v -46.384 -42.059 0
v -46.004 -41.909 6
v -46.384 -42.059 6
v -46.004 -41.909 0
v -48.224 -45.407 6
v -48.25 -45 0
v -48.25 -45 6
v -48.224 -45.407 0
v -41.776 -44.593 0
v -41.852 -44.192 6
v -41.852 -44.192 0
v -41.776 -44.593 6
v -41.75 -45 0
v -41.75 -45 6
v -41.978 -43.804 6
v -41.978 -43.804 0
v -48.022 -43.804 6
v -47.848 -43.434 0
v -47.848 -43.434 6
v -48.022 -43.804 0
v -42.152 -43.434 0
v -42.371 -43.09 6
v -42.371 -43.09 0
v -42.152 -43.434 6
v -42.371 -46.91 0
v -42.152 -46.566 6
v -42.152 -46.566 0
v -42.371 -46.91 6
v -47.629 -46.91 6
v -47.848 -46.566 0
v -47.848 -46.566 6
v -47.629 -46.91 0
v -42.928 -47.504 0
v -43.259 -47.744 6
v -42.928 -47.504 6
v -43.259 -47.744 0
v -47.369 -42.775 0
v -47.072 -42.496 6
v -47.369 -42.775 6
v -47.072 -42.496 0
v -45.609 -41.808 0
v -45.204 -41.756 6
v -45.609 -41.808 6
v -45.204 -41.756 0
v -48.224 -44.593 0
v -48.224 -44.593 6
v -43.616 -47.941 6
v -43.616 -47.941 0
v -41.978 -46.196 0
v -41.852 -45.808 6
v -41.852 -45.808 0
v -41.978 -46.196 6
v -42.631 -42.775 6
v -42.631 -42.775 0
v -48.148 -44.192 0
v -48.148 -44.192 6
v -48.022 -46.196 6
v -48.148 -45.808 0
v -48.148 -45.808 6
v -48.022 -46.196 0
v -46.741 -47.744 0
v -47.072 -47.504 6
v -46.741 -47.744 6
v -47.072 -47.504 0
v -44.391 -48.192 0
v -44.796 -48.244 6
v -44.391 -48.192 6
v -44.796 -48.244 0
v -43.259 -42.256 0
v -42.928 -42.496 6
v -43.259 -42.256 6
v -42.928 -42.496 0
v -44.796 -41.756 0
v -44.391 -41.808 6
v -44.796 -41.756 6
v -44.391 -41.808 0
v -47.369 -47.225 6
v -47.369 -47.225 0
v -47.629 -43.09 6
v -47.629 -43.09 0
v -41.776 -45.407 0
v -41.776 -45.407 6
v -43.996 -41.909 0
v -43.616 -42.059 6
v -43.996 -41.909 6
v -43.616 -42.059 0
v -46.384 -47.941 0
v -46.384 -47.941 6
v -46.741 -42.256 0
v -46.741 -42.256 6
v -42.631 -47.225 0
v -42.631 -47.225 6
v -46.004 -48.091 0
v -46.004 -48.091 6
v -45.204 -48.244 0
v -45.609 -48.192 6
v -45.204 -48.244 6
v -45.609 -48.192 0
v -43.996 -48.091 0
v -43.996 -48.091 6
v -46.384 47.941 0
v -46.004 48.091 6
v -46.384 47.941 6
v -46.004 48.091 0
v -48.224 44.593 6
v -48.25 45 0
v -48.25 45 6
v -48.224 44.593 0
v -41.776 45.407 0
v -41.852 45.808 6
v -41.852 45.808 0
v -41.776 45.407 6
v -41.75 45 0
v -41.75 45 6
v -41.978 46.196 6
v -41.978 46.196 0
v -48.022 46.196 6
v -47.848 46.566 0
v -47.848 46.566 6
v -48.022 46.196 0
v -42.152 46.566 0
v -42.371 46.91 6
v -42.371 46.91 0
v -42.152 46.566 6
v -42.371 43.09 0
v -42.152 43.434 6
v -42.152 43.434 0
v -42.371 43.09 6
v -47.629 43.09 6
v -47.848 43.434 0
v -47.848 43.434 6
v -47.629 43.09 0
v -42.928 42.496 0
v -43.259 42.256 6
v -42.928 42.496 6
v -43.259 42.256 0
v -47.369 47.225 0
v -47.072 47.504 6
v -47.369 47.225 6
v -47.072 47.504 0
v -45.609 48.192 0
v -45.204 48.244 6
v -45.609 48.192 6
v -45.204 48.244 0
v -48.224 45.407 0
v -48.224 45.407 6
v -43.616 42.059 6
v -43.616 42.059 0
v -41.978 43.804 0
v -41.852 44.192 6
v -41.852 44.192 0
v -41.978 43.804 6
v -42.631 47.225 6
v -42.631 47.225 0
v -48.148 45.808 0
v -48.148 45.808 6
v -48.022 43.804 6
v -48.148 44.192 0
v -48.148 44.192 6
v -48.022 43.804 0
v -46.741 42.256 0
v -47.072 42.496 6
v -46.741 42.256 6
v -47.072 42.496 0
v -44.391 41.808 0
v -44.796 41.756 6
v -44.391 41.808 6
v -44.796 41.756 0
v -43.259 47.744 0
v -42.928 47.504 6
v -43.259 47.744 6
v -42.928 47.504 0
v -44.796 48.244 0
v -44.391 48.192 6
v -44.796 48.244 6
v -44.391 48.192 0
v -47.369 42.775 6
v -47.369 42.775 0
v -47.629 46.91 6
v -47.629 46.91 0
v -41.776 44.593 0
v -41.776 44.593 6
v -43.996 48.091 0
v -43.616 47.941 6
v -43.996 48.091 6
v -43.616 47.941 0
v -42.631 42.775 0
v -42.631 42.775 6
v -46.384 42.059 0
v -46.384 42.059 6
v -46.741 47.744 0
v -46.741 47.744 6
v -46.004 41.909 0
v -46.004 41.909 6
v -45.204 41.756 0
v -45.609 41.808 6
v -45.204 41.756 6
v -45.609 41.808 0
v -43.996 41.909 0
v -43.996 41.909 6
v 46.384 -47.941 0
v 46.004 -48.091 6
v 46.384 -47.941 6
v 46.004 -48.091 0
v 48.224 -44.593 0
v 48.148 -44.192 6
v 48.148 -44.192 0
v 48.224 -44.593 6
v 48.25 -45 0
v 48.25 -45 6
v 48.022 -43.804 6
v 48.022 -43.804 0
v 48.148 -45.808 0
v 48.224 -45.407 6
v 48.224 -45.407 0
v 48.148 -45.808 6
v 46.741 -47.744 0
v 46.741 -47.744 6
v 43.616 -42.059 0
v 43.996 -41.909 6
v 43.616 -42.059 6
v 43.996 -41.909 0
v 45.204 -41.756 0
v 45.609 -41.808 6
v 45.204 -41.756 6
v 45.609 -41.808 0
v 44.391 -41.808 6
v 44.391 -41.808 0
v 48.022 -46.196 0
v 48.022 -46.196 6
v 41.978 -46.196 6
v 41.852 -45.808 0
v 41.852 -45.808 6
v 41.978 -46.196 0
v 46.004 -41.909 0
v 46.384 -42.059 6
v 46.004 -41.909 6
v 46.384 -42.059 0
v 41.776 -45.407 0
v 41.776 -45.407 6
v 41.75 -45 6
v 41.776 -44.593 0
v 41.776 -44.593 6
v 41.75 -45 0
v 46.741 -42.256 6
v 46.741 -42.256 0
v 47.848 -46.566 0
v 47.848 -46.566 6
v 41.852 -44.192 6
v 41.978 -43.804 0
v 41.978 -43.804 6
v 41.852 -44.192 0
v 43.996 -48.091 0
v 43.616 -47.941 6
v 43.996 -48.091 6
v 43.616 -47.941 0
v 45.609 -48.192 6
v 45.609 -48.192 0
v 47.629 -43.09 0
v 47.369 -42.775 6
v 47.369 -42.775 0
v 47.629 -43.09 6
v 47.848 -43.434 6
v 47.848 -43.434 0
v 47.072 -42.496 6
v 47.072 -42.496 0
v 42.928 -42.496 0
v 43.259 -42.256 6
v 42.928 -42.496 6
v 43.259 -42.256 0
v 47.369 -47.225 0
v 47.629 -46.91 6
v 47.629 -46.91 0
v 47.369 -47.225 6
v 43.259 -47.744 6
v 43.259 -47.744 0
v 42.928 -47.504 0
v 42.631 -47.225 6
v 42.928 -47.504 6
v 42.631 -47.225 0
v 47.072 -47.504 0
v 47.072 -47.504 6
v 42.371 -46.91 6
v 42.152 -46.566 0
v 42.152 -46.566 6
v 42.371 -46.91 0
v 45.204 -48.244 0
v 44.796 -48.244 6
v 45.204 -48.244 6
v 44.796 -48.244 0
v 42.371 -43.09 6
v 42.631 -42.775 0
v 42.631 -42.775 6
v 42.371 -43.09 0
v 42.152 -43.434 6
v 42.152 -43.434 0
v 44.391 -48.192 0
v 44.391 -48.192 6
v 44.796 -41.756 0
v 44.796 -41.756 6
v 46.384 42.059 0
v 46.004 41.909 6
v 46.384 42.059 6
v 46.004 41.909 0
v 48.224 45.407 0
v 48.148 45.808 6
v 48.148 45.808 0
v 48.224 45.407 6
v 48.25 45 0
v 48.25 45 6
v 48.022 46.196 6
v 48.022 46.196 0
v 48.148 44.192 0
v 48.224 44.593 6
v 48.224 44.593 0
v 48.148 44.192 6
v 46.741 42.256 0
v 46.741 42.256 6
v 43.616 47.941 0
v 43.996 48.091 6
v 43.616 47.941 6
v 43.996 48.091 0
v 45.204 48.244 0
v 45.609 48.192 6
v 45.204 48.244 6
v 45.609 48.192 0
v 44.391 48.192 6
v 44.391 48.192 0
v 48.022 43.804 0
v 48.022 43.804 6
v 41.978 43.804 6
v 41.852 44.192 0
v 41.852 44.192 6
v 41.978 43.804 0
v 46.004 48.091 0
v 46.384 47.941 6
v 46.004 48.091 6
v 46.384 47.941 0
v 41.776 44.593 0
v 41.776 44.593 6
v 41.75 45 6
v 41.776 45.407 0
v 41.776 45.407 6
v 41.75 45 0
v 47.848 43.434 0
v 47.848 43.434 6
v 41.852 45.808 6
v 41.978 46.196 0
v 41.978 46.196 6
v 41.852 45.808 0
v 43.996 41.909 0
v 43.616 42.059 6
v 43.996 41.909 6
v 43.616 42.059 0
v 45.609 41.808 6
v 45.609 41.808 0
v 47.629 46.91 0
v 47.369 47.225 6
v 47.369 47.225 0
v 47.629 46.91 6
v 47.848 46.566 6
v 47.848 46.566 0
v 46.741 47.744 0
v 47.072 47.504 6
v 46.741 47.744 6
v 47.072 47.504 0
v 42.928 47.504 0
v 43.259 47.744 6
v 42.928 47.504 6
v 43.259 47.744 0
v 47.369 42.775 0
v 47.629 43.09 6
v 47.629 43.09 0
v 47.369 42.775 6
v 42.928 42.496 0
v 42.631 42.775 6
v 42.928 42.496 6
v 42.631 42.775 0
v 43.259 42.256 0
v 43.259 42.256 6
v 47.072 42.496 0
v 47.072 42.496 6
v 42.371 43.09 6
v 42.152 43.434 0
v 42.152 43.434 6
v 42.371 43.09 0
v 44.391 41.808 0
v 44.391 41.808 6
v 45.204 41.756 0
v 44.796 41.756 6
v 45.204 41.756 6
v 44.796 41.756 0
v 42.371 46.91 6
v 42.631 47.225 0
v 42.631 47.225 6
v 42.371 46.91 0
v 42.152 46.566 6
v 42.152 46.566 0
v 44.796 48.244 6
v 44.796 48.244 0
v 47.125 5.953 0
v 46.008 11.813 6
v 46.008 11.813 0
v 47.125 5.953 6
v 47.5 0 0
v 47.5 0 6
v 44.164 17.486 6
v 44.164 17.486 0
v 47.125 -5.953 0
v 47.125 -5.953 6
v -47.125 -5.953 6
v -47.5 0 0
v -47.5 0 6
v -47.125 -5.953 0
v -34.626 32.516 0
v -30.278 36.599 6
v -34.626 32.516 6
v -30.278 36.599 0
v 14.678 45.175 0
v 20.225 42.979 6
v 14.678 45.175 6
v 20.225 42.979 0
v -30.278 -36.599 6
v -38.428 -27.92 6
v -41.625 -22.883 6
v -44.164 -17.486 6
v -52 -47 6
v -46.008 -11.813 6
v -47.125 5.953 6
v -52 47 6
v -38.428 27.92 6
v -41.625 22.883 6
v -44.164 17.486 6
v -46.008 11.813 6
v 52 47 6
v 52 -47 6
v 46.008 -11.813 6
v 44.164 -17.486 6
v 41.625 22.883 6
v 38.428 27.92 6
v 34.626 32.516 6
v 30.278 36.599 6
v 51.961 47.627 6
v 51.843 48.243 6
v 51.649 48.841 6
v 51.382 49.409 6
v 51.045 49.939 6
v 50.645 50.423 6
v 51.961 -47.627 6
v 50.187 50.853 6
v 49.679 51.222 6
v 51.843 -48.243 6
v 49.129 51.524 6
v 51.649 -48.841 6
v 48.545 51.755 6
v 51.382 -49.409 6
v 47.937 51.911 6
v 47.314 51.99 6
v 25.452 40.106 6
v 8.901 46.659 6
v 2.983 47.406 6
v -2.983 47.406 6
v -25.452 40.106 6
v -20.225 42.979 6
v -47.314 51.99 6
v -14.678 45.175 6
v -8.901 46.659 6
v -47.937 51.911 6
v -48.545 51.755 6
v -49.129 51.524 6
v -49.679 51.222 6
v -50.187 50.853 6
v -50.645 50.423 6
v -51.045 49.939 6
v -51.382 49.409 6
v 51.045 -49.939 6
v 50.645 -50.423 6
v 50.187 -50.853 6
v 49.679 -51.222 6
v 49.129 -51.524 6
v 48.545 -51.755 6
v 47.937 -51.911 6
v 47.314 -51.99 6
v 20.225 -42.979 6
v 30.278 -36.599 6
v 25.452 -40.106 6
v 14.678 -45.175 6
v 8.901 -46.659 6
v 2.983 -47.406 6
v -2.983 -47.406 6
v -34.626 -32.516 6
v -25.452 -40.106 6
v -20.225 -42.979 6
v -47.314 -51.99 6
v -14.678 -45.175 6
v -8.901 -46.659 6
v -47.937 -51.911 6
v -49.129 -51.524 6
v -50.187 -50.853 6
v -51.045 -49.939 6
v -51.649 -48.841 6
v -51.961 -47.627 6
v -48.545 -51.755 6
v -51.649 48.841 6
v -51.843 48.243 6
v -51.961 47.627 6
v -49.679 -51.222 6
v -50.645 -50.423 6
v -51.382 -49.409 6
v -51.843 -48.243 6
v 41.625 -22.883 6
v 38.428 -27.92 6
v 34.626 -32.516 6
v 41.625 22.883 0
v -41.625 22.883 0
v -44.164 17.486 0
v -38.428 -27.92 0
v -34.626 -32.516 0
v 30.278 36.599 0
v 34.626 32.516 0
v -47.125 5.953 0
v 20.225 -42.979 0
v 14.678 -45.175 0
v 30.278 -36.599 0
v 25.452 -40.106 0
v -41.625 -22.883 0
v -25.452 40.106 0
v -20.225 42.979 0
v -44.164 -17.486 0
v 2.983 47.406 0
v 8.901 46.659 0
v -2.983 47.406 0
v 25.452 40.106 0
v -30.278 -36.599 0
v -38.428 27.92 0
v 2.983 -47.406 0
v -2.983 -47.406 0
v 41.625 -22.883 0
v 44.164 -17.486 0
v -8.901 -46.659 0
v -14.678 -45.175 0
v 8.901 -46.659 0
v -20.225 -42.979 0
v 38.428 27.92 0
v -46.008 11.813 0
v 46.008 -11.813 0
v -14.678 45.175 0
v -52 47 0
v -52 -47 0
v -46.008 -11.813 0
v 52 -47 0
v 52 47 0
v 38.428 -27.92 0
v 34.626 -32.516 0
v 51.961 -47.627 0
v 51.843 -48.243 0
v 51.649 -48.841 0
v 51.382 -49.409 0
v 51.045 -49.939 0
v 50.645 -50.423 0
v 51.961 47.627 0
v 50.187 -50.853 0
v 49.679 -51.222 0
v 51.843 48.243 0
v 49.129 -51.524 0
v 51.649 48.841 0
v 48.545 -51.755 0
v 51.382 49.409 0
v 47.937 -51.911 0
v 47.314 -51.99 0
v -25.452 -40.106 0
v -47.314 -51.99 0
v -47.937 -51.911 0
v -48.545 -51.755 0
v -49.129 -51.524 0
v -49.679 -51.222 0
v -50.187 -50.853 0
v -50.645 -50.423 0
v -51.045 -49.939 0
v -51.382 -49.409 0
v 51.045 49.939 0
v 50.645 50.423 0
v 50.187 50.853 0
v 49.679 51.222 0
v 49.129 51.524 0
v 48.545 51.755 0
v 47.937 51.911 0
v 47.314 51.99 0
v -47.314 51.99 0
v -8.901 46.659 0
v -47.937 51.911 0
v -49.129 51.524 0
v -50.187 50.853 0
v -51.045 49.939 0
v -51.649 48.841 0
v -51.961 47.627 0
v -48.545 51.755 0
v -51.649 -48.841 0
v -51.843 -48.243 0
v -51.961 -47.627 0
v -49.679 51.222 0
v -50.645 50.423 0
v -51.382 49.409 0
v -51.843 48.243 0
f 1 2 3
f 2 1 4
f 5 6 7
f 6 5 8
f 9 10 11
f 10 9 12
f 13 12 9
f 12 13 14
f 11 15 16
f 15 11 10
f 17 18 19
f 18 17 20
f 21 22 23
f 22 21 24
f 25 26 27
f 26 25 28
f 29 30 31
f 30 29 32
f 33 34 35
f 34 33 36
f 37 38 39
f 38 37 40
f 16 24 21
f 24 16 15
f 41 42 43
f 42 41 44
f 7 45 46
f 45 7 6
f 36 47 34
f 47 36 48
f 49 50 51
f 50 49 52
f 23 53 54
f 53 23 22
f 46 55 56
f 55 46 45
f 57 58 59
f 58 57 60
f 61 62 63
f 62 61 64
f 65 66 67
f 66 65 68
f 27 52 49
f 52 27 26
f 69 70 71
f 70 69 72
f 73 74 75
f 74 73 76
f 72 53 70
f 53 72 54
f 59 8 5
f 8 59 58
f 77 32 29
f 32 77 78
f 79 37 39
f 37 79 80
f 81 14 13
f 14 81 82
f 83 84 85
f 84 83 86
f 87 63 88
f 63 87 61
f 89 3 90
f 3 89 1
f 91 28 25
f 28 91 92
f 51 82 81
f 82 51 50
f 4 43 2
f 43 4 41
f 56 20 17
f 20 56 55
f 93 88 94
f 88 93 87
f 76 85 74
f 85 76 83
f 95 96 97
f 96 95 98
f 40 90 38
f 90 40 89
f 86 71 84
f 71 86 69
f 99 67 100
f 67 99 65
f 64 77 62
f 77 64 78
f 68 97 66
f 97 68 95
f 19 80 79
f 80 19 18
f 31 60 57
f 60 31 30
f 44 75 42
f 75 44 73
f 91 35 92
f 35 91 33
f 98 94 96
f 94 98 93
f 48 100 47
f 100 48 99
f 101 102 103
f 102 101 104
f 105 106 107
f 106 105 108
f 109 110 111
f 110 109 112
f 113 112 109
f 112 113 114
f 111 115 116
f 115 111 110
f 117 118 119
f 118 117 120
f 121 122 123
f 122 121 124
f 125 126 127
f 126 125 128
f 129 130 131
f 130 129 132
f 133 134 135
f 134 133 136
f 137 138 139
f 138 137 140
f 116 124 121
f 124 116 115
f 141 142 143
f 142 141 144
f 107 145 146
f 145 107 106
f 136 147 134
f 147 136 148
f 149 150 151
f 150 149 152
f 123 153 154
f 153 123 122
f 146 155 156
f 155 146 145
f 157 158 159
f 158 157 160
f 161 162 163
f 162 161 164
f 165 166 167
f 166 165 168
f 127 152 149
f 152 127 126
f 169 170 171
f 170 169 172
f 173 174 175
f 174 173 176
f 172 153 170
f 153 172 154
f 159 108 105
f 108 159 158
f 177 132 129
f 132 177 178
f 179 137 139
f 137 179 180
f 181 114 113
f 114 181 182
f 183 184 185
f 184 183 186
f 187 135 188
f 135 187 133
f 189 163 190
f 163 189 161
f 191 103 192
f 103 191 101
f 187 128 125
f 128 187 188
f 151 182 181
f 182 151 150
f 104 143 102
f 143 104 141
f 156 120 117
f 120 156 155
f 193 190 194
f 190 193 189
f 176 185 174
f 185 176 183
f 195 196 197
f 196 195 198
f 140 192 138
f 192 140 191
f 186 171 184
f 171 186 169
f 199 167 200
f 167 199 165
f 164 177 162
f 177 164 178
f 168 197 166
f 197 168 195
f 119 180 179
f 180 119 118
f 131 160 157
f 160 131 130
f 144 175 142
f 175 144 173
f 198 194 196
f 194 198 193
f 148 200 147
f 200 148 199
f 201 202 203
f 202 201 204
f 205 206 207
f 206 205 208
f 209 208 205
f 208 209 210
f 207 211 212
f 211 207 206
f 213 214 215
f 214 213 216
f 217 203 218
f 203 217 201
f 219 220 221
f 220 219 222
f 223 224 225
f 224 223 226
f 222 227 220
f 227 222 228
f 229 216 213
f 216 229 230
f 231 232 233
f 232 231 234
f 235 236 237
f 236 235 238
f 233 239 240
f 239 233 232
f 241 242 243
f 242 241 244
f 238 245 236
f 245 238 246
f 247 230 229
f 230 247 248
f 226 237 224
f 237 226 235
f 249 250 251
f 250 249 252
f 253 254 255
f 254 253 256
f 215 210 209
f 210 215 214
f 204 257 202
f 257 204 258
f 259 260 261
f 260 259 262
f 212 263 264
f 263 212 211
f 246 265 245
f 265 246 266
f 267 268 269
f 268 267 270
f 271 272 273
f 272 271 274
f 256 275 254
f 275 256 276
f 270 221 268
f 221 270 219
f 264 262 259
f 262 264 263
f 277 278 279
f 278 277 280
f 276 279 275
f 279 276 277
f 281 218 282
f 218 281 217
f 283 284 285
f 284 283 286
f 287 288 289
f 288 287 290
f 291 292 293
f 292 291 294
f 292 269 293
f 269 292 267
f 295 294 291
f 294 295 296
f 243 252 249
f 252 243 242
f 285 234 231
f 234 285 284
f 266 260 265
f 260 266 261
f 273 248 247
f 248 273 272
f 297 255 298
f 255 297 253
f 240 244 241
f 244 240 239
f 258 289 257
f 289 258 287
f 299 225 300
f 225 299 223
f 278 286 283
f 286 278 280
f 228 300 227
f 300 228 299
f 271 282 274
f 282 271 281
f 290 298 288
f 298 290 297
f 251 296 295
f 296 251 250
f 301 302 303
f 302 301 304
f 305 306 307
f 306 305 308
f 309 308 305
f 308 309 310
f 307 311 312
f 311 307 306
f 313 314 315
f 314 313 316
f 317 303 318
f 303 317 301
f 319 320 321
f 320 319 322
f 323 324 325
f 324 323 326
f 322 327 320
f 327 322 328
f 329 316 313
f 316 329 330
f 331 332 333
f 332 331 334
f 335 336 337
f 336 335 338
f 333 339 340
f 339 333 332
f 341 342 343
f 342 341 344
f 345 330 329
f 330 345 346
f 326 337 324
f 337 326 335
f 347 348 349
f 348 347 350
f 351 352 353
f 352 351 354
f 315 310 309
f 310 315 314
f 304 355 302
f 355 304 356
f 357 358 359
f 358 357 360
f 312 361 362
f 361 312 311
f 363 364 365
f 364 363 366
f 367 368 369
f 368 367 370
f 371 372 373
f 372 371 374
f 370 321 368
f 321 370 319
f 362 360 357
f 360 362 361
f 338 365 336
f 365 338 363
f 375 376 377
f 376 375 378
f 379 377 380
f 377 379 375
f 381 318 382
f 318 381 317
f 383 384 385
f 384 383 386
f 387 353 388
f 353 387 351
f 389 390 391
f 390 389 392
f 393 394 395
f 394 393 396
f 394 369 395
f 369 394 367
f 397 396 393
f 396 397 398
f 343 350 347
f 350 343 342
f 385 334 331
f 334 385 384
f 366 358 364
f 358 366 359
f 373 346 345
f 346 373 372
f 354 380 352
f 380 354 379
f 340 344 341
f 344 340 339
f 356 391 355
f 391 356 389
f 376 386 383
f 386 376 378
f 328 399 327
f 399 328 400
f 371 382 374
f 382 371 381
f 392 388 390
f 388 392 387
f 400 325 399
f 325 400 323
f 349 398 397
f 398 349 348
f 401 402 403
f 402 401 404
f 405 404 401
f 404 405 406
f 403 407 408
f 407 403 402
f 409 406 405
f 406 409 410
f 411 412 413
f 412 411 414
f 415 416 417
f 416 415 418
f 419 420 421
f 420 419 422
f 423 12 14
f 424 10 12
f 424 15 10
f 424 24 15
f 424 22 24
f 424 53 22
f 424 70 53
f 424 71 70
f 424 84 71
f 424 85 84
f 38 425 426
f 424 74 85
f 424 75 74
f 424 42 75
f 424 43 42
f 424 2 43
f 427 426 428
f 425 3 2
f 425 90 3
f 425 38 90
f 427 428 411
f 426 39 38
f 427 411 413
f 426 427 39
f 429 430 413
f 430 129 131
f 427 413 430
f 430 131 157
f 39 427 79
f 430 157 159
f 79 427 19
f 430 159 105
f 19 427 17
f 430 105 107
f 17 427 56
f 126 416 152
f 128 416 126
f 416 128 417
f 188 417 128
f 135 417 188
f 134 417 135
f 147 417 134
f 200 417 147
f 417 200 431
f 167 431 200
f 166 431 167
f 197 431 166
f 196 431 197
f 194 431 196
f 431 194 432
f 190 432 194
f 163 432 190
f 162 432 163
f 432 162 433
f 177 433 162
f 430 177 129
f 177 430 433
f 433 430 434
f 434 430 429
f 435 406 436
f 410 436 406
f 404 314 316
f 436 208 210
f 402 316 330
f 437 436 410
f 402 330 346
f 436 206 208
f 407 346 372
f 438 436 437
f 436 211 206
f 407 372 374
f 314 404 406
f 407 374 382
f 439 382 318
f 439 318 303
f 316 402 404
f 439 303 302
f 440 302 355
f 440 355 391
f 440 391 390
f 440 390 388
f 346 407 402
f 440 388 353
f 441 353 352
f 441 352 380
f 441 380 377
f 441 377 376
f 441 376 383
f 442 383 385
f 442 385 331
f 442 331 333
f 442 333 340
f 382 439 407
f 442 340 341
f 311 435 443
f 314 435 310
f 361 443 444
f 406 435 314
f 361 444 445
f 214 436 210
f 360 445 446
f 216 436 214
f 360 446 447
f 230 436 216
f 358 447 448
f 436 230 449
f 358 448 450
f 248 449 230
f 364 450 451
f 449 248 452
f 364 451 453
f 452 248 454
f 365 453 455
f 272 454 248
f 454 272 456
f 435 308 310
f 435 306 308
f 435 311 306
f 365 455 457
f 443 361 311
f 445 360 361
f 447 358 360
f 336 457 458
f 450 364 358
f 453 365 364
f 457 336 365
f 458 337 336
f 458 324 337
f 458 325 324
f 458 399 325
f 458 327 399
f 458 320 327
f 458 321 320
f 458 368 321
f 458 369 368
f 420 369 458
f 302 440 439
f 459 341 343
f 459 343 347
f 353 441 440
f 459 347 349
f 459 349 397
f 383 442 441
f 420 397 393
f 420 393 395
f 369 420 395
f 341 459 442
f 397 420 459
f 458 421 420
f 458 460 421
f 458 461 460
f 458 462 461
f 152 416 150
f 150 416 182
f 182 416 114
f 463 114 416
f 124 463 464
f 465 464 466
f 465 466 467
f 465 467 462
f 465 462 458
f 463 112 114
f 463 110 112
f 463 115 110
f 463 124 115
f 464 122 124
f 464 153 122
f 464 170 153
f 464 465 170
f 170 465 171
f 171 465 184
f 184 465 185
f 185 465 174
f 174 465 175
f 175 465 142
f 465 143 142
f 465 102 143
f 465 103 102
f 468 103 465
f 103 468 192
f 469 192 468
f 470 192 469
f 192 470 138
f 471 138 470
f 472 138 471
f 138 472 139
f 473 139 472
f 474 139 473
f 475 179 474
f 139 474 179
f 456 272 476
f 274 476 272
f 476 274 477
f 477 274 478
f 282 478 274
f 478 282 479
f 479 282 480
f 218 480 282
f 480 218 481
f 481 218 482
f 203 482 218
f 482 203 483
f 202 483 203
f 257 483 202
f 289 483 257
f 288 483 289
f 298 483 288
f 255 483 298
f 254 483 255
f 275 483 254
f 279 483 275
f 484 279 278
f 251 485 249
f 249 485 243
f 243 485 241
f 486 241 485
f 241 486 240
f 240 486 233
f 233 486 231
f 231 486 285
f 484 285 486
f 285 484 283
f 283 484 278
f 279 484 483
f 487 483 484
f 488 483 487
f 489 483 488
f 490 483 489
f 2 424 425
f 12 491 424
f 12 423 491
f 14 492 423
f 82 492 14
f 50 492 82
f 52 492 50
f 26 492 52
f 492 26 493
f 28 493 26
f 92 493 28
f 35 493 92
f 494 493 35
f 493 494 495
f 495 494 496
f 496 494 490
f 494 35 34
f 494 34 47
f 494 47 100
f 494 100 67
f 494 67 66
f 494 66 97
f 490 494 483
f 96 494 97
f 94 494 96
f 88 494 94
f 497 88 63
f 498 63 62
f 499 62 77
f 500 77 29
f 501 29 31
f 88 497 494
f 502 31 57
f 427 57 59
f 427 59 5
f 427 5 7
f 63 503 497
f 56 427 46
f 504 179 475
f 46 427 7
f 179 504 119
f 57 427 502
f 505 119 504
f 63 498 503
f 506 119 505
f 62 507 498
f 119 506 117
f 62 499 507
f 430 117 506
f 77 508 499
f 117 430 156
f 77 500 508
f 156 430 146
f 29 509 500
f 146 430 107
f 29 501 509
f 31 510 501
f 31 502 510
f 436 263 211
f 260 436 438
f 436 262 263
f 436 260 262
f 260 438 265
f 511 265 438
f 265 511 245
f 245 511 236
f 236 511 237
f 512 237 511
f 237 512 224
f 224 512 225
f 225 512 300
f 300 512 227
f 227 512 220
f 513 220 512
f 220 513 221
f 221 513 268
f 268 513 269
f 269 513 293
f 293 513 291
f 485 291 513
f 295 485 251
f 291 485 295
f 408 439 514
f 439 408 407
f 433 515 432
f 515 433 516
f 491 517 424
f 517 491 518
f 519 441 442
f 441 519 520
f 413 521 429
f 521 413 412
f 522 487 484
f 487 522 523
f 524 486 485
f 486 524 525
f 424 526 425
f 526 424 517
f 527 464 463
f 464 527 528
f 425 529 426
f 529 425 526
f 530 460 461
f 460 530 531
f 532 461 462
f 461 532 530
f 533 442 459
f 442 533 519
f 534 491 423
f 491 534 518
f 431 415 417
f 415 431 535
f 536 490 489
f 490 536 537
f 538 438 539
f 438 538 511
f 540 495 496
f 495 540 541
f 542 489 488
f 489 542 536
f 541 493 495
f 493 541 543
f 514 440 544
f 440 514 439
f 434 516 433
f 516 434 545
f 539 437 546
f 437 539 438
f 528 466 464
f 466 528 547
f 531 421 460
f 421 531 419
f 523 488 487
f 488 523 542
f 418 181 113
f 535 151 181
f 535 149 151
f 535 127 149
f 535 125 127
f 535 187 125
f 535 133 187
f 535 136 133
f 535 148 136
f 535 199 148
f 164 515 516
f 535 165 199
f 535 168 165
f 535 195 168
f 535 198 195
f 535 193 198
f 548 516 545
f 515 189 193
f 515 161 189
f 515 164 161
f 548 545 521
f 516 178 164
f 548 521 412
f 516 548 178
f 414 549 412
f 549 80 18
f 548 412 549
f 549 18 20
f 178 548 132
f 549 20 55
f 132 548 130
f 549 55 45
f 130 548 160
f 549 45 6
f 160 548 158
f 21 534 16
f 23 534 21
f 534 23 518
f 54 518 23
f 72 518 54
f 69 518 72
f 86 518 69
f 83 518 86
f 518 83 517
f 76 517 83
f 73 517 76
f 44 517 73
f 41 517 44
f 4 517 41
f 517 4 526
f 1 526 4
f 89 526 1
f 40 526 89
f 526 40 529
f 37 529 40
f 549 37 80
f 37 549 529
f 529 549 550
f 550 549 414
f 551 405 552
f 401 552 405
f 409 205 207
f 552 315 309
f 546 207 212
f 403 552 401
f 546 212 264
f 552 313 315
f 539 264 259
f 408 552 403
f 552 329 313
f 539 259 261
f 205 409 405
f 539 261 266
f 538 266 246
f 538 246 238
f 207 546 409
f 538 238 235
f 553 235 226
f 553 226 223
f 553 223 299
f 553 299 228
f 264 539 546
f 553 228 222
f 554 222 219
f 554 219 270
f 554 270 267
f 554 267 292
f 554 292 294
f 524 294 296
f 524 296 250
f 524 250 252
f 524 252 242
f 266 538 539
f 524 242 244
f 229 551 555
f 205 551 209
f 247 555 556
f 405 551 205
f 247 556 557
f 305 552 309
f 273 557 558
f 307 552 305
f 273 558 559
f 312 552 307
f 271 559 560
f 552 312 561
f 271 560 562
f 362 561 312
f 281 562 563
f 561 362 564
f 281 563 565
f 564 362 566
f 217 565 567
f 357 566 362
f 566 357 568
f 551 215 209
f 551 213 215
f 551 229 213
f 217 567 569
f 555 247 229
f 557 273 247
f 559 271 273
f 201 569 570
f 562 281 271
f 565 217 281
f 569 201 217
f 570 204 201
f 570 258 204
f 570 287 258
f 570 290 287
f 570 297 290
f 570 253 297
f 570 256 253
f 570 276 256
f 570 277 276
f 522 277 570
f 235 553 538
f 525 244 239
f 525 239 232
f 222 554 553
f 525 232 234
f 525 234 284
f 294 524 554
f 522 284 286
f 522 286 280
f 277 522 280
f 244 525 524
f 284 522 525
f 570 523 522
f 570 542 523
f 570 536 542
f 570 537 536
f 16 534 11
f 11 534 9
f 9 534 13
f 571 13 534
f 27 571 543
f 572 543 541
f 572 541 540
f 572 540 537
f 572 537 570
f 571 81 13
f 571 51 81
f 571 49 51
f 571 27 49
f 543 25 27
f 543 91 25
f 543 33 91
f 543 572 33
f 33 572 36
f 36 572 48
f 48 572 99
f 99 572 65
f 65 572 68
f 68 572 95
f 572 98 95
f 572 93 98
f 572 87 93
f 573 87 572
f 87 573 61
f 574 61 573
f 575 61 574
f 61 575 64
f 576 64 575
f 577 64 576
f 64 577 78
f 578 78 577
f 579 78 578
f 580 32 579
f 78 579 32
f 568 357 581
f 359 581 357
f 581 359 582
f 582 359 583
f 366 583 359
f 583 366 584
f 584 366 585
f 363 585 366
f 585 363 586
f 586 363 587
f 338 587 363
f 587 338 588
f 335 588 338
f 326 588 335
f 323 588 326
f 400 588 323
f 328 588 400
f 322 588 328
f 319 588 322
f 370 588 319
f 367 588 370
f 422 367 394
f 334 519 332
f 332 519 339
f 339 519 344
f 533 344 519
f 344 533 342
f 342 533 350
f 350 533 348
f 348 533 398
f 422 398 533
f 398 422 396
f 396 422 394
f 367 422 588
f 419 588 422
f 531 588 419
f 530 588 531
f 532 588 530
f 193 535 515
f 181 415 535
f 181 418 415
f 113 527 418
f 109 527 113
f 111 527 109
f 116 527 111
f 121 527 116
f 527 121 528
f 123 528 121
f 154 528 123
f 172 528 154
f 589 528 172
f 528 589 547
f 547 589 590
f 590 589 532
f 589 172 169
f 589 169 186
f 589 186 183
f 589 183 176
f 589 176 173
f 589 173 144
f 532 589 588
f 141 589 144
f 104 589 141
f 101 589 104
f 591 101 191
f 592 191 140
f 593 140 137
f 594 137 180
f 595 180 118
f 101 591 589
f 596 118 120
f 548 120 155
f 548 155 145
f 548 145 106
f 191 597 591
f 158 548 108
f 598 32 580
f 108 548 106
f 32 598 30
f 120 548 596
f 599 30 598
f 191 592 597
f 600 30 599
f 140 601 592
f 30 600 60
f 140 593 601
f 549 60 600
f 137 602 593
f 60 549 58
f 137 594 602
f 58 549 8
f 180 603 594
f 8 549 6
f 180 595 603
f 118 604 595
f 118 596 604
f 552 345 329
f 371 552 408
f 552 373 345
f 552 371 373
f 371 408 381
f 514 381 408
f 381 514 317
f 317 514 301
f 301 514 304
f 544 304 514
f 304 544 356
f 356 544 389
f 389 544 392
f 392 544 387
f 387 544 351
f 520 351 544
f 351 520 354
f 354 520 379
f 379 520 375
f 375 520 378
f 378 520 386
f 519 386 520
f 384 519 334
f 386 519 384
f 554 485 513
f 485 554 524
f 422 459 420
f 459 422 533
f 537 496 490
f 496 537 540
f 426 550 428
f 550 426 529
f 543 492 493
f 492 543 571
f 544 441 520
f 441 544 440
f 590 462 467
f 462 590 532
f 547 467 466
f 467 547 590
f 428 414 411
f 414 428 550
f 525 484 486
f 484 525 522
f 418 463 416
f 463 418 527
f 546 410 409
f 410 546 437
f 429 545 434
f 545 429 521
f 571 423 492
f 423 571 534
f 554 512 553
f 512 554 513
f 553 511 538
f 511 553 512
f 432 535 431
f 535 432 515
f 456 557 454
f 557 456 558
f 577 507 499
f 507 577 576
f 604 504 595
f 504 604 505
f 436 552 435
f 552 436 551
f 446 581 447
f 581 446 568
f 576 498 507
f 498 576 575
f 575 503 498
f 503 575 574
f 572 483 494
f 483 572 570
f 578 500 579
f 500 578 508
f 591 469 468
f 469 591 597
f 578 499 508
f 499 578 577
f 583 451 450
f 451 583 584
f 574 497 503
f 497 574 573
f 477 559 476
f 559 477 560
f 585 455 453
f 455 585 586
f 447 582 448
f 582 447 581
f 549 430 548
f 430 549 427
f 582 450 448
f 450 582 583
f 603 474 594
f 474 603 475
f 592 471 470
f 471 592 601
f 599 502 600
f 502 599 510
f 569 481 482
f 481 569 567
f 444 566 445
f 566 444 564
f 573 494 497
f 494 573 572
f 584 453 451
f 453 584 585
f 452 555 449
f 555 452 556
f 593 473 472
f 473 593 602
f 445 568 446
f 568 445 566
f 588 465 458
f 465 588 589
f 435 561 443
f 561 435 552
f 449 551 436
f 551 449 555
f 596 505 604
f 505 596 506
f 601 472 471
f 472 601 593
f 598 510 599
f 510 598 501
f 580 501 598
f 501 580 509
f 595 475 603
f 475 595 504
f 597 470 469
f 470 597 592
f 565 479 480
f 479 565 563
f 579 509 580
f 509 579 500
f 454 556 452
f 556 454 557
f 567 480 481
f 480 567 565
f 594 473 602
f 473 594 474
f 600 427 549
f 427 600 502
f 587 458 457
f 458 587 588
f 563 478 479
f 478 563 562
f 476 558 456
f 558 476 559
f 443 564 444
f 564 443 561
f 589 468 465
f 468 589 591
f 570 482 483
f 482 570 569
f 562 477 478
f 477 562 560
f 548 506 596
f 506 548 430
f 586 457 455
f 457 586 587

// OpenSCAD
$fn = 50;


difference() {
	union() {
		hull() {
			translate(v = [-47.0000000000, 47.0000000000, 0]) {
				cylinder(h = 6, r = 5);
			}
			translate(v = [47.0000000000, 47.0000000000, 0]) {
				cylinder(h = 6, r = 5);
			}
			translate(v = [-47.0000000000, -47.0000000000, 0]) {
				cylinder(h = 6, r = 5);
			}
			translate(v = [47.0000000000, -47.0000000000, 0]) {
				cylinder(h = 6, r = 5);
			}
		}
	}
	union() {
		#translate(v = [-45.0000000000, -45.0000000000, -100.0000000000]) {
			cylinder(h = 200, r = 3.2500000000);
		}
		#translate(v = [-45.0000000000, 45.0000000000, -100.0000000000]) {
			cylinder(h = 200, r = 3.2500000000);
		}
		#translate(v = [45.0000000000, -45.0000000000, -100.0000000000]) {
			cylinder(h = 200, r = 3.2500000000);
		}
		#translate(v = [45.0000000000, 45.0000000000, -100.0000000000]) {
			cylinder(h = 200, r = 3.2500000000);
		}
		#cylinder(h = 6, r = 47.5000000000);
	}
}
